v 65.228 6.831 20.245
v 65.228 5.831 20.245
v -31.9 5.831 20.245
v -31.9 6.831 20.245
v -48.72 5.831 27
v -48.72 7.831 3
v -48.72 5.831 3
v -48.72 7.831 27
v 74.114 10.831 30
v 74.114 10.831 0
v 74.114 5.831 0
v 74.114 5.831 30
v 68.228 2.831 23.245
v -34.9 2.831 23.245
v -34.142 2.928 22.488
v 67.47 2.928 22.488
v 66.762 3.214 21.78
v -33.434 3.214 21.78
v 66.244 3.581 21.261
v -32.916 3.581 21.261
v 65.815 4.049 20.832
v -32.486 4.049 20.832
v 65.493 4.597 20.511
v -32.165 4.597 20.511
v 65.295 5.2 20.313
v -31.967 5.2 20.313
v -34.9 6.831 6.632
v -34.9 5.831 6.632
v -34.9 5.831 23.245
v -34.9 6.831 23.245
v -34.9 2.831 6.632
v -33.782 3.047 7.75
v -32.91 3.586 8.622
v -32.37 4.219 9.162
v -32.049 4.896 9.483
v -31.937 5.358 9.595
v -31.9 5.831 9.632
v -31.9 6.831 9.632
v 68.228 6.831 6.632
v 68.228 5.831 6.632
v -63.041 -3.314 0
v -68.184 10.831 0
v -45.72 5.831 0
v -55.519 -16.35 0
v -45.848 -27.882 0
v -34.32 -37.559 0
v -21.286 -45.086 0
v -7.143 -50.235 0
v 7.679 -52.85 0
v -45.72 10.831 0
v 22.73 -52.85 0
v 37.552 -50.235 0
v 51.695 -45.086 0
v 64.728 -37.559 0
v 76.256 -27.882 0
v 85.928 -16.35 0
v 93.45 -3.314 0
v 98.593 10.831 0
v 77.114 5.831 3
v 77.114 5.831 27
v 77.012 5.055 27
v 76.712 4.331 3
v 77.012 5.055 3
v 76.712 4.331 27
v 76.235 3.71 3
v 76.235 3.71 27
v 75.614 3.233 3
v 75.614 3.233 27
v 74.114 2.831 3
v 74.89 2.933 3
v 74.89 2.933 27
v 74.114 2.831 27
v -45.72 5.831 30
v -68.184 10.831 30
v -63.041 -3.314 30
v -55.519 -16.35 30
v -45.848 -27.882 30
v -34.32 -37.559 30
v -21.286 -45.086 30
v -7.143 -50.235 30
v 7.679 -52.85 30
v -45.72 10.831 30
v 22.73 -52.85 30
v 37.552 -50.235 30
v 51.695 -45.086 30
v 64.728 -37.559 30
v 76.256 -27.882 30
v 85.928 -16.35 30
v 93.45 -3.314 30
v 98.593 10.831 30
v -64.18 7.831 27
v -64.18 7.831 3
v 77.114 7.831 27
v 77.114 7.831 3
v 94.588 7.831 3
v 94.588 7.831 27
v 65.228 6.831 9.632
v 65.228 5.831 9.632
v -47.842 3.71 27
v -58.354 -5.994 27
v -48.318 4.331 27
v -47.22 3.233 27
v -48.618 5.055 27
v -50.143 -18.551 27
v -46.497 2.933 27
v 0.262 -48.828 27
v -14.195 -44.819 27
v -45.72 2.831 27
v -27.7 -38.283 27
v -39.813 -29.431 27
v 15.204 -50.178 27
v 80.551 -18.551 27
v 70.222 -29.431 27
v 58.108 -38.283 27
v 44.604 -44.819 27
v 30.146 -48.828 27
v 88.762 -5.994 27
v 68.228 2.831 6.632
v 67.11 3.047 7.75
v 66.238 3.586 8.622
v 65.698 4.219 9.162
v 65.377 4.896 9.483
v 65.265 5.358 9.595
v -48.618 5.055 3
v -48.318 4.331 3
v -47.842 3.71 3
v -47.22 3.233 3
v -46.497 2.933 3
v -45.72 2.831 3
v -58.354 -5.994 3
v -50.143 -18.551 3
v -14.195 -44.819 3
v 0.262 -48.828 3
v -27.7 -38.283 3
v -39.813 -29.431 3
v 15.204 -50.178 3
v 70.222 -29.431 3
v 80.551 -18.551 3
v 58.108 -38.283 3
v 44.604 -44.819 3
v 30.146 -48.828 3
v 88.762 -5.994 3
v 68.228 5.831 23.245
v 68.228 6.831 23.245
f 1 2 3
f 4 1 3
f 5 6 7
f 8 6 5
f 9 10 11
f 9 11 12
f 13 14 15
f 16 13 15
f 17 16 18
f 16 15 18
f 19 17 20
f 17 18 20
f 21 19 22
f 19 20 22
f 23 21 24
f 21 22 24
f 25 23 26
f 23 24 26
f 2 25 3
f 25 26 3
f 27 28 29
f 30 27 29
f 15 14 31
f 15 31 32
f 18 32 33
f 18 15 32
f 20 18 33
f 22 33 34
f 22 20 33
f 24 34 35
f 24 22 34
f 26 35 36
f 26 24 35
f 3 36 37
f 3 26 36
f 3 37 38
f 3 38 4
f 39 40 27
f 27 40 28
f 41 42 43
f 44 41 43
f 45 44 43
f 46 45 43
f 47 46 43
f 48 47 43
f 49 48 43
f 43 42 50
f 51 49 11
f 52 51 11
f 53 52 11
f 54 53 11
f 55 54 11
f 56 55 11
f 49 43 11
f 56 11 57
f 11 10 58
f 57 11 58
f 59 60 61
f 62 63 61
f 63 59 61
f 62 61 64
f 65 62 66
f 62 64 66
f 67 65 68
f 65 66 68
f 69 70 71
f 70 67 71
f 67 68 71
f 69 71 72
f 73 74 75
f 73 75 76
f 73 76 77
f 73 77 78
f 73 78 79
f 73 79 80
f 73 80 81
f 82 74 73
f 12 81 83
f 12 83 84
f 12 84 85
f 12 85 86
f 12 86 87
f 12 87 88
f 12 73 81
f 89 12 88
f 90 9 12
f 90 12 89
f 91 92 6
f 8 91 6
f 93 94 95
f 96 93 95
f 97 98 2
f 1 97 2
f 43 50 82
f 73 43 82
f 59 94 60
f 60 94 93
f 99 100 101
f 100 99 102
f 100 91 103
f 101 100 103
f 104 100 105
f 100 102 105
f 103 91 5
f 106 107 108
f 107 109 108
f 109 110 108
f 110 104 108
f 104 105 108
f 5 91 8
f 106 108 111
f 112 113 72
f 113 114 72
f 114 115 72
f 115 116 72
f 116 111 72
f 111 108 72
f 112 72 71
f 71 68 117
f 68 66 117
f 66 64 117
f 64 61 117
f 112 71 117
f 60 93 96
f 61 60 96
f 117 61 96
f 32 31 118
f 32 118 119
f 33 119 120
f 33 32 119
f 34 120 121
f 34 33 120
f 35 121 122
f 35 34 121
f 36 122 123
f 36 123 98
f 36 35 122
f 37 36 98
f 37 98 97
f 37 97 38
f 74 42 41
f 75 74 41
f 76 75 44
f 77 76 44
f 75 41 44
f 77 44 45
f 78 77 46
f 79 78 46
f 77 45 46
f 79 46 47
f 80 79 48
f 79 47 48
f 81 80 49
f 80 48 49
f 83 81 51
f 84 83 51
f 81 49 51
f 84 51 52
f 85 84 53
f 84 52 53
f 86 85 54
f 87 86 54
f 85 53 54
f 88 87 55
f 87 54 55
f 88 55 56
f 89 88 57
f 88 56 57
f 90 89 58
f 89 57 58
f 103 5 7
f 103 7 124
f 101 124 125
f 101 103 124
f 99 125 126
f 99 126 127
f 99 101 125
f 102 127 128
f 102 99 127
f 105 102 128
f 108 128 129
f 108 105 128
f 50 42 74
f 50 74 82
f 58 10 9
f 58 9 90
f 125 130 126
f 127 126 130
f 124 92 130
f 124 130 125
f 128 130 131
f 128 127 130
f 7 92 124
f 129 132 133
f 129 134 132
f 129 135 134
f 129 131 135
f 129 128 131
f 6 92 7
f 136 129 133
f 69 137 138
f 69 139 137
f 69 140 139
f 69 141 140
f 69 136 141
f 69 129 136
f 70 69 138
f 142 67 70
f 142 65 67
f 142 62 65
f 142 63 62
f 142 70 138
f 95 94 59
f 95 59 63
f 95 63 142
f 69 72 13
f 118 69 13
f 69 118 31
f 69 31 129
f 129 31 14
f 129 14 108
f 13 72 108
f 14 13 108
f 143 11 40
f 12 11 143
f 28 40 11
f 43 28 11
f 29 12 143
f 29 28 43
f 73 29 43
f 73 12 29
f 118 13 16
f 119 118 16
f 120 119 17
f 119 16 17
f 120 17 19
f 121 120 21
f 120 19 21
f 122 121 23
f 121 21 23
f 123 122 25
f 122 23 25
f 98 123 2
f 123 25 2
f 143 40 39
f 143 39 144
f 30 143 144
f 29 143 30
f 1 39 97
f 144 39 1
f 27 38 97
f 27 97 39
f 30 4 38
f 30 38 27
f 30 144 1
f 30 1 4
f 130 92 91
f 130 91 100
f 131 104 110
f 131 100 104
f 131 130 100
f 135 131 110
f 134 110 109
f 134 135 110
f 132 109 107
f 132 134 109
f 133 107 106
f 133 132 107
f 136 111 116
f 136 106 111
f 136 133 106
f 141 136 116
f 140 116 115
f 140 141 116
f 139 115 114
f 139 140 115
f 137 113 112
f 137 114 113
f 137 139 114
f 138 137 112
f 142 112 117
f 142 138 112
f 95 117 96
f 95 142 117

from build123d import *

# Parameters (mm, degrees)
PAD002_DEPTH   = 30
SKETCH002_W    = 119.834198
SKETCH002_H    = 56.27994
POCKET_DEPTH   = 5
SKETCH003_W    = 103.127247
SKETCH003_H    = 16.613194
PAD003_DEPTH   = 1
THICKNESS001_T = -3


with BuildPart() as part:
    # Sketch001 → Pad002 (new body)
    with BuildSketch(Plane.XY):
        with BuildLine():
            ThreePointArc((-68.184374, 10.831253), (15.204238, -53.178213), (98.592851, 10.831253))
            Line((-68.184374, 10.831253), (98.592851, 10.831253))
        make_face()
    extrude(amount=PAD002_DEPTH)

    # Sketch002 (on Face2 of Pad002) → Pocket (cut)
    with BuildSketch(Plane(origin=(0, 10.831253, 0), x_dir=(-1, 0, 0), z_dir=(0, 1, 0))):
        with Locations((-14.19677, 16.75429)):
            Rectangle(SKETCH002_W, SKETCH002_H)
    extrude(amount=-POCKET_DEPTH, mode=Mode.SUBTRACT)

    # Sketch003 (on Face8 of Pocket) → Pad003 (join)
    with BuildSketch(Plane(origin=(0, 5.831253, 0), x_dir=(-1, 0, 0), z_dir=(0, 1, 0))):
        with Locations((-16.664015, 14.938789)):
            Rectangle(SKETCH003_W, SKETCH003_H)
    extrude(amount=PAD003_DEPTH)

    # Thickness001
    thickness001_openings = [part.faces().sort_by_distance(p)[0] for p in [
        (16.664015, 6.831253, 14.938789),
    ]]
    offset(amount=THICKNESS001_T, openings=thickness001_openings)


solid = part.part
